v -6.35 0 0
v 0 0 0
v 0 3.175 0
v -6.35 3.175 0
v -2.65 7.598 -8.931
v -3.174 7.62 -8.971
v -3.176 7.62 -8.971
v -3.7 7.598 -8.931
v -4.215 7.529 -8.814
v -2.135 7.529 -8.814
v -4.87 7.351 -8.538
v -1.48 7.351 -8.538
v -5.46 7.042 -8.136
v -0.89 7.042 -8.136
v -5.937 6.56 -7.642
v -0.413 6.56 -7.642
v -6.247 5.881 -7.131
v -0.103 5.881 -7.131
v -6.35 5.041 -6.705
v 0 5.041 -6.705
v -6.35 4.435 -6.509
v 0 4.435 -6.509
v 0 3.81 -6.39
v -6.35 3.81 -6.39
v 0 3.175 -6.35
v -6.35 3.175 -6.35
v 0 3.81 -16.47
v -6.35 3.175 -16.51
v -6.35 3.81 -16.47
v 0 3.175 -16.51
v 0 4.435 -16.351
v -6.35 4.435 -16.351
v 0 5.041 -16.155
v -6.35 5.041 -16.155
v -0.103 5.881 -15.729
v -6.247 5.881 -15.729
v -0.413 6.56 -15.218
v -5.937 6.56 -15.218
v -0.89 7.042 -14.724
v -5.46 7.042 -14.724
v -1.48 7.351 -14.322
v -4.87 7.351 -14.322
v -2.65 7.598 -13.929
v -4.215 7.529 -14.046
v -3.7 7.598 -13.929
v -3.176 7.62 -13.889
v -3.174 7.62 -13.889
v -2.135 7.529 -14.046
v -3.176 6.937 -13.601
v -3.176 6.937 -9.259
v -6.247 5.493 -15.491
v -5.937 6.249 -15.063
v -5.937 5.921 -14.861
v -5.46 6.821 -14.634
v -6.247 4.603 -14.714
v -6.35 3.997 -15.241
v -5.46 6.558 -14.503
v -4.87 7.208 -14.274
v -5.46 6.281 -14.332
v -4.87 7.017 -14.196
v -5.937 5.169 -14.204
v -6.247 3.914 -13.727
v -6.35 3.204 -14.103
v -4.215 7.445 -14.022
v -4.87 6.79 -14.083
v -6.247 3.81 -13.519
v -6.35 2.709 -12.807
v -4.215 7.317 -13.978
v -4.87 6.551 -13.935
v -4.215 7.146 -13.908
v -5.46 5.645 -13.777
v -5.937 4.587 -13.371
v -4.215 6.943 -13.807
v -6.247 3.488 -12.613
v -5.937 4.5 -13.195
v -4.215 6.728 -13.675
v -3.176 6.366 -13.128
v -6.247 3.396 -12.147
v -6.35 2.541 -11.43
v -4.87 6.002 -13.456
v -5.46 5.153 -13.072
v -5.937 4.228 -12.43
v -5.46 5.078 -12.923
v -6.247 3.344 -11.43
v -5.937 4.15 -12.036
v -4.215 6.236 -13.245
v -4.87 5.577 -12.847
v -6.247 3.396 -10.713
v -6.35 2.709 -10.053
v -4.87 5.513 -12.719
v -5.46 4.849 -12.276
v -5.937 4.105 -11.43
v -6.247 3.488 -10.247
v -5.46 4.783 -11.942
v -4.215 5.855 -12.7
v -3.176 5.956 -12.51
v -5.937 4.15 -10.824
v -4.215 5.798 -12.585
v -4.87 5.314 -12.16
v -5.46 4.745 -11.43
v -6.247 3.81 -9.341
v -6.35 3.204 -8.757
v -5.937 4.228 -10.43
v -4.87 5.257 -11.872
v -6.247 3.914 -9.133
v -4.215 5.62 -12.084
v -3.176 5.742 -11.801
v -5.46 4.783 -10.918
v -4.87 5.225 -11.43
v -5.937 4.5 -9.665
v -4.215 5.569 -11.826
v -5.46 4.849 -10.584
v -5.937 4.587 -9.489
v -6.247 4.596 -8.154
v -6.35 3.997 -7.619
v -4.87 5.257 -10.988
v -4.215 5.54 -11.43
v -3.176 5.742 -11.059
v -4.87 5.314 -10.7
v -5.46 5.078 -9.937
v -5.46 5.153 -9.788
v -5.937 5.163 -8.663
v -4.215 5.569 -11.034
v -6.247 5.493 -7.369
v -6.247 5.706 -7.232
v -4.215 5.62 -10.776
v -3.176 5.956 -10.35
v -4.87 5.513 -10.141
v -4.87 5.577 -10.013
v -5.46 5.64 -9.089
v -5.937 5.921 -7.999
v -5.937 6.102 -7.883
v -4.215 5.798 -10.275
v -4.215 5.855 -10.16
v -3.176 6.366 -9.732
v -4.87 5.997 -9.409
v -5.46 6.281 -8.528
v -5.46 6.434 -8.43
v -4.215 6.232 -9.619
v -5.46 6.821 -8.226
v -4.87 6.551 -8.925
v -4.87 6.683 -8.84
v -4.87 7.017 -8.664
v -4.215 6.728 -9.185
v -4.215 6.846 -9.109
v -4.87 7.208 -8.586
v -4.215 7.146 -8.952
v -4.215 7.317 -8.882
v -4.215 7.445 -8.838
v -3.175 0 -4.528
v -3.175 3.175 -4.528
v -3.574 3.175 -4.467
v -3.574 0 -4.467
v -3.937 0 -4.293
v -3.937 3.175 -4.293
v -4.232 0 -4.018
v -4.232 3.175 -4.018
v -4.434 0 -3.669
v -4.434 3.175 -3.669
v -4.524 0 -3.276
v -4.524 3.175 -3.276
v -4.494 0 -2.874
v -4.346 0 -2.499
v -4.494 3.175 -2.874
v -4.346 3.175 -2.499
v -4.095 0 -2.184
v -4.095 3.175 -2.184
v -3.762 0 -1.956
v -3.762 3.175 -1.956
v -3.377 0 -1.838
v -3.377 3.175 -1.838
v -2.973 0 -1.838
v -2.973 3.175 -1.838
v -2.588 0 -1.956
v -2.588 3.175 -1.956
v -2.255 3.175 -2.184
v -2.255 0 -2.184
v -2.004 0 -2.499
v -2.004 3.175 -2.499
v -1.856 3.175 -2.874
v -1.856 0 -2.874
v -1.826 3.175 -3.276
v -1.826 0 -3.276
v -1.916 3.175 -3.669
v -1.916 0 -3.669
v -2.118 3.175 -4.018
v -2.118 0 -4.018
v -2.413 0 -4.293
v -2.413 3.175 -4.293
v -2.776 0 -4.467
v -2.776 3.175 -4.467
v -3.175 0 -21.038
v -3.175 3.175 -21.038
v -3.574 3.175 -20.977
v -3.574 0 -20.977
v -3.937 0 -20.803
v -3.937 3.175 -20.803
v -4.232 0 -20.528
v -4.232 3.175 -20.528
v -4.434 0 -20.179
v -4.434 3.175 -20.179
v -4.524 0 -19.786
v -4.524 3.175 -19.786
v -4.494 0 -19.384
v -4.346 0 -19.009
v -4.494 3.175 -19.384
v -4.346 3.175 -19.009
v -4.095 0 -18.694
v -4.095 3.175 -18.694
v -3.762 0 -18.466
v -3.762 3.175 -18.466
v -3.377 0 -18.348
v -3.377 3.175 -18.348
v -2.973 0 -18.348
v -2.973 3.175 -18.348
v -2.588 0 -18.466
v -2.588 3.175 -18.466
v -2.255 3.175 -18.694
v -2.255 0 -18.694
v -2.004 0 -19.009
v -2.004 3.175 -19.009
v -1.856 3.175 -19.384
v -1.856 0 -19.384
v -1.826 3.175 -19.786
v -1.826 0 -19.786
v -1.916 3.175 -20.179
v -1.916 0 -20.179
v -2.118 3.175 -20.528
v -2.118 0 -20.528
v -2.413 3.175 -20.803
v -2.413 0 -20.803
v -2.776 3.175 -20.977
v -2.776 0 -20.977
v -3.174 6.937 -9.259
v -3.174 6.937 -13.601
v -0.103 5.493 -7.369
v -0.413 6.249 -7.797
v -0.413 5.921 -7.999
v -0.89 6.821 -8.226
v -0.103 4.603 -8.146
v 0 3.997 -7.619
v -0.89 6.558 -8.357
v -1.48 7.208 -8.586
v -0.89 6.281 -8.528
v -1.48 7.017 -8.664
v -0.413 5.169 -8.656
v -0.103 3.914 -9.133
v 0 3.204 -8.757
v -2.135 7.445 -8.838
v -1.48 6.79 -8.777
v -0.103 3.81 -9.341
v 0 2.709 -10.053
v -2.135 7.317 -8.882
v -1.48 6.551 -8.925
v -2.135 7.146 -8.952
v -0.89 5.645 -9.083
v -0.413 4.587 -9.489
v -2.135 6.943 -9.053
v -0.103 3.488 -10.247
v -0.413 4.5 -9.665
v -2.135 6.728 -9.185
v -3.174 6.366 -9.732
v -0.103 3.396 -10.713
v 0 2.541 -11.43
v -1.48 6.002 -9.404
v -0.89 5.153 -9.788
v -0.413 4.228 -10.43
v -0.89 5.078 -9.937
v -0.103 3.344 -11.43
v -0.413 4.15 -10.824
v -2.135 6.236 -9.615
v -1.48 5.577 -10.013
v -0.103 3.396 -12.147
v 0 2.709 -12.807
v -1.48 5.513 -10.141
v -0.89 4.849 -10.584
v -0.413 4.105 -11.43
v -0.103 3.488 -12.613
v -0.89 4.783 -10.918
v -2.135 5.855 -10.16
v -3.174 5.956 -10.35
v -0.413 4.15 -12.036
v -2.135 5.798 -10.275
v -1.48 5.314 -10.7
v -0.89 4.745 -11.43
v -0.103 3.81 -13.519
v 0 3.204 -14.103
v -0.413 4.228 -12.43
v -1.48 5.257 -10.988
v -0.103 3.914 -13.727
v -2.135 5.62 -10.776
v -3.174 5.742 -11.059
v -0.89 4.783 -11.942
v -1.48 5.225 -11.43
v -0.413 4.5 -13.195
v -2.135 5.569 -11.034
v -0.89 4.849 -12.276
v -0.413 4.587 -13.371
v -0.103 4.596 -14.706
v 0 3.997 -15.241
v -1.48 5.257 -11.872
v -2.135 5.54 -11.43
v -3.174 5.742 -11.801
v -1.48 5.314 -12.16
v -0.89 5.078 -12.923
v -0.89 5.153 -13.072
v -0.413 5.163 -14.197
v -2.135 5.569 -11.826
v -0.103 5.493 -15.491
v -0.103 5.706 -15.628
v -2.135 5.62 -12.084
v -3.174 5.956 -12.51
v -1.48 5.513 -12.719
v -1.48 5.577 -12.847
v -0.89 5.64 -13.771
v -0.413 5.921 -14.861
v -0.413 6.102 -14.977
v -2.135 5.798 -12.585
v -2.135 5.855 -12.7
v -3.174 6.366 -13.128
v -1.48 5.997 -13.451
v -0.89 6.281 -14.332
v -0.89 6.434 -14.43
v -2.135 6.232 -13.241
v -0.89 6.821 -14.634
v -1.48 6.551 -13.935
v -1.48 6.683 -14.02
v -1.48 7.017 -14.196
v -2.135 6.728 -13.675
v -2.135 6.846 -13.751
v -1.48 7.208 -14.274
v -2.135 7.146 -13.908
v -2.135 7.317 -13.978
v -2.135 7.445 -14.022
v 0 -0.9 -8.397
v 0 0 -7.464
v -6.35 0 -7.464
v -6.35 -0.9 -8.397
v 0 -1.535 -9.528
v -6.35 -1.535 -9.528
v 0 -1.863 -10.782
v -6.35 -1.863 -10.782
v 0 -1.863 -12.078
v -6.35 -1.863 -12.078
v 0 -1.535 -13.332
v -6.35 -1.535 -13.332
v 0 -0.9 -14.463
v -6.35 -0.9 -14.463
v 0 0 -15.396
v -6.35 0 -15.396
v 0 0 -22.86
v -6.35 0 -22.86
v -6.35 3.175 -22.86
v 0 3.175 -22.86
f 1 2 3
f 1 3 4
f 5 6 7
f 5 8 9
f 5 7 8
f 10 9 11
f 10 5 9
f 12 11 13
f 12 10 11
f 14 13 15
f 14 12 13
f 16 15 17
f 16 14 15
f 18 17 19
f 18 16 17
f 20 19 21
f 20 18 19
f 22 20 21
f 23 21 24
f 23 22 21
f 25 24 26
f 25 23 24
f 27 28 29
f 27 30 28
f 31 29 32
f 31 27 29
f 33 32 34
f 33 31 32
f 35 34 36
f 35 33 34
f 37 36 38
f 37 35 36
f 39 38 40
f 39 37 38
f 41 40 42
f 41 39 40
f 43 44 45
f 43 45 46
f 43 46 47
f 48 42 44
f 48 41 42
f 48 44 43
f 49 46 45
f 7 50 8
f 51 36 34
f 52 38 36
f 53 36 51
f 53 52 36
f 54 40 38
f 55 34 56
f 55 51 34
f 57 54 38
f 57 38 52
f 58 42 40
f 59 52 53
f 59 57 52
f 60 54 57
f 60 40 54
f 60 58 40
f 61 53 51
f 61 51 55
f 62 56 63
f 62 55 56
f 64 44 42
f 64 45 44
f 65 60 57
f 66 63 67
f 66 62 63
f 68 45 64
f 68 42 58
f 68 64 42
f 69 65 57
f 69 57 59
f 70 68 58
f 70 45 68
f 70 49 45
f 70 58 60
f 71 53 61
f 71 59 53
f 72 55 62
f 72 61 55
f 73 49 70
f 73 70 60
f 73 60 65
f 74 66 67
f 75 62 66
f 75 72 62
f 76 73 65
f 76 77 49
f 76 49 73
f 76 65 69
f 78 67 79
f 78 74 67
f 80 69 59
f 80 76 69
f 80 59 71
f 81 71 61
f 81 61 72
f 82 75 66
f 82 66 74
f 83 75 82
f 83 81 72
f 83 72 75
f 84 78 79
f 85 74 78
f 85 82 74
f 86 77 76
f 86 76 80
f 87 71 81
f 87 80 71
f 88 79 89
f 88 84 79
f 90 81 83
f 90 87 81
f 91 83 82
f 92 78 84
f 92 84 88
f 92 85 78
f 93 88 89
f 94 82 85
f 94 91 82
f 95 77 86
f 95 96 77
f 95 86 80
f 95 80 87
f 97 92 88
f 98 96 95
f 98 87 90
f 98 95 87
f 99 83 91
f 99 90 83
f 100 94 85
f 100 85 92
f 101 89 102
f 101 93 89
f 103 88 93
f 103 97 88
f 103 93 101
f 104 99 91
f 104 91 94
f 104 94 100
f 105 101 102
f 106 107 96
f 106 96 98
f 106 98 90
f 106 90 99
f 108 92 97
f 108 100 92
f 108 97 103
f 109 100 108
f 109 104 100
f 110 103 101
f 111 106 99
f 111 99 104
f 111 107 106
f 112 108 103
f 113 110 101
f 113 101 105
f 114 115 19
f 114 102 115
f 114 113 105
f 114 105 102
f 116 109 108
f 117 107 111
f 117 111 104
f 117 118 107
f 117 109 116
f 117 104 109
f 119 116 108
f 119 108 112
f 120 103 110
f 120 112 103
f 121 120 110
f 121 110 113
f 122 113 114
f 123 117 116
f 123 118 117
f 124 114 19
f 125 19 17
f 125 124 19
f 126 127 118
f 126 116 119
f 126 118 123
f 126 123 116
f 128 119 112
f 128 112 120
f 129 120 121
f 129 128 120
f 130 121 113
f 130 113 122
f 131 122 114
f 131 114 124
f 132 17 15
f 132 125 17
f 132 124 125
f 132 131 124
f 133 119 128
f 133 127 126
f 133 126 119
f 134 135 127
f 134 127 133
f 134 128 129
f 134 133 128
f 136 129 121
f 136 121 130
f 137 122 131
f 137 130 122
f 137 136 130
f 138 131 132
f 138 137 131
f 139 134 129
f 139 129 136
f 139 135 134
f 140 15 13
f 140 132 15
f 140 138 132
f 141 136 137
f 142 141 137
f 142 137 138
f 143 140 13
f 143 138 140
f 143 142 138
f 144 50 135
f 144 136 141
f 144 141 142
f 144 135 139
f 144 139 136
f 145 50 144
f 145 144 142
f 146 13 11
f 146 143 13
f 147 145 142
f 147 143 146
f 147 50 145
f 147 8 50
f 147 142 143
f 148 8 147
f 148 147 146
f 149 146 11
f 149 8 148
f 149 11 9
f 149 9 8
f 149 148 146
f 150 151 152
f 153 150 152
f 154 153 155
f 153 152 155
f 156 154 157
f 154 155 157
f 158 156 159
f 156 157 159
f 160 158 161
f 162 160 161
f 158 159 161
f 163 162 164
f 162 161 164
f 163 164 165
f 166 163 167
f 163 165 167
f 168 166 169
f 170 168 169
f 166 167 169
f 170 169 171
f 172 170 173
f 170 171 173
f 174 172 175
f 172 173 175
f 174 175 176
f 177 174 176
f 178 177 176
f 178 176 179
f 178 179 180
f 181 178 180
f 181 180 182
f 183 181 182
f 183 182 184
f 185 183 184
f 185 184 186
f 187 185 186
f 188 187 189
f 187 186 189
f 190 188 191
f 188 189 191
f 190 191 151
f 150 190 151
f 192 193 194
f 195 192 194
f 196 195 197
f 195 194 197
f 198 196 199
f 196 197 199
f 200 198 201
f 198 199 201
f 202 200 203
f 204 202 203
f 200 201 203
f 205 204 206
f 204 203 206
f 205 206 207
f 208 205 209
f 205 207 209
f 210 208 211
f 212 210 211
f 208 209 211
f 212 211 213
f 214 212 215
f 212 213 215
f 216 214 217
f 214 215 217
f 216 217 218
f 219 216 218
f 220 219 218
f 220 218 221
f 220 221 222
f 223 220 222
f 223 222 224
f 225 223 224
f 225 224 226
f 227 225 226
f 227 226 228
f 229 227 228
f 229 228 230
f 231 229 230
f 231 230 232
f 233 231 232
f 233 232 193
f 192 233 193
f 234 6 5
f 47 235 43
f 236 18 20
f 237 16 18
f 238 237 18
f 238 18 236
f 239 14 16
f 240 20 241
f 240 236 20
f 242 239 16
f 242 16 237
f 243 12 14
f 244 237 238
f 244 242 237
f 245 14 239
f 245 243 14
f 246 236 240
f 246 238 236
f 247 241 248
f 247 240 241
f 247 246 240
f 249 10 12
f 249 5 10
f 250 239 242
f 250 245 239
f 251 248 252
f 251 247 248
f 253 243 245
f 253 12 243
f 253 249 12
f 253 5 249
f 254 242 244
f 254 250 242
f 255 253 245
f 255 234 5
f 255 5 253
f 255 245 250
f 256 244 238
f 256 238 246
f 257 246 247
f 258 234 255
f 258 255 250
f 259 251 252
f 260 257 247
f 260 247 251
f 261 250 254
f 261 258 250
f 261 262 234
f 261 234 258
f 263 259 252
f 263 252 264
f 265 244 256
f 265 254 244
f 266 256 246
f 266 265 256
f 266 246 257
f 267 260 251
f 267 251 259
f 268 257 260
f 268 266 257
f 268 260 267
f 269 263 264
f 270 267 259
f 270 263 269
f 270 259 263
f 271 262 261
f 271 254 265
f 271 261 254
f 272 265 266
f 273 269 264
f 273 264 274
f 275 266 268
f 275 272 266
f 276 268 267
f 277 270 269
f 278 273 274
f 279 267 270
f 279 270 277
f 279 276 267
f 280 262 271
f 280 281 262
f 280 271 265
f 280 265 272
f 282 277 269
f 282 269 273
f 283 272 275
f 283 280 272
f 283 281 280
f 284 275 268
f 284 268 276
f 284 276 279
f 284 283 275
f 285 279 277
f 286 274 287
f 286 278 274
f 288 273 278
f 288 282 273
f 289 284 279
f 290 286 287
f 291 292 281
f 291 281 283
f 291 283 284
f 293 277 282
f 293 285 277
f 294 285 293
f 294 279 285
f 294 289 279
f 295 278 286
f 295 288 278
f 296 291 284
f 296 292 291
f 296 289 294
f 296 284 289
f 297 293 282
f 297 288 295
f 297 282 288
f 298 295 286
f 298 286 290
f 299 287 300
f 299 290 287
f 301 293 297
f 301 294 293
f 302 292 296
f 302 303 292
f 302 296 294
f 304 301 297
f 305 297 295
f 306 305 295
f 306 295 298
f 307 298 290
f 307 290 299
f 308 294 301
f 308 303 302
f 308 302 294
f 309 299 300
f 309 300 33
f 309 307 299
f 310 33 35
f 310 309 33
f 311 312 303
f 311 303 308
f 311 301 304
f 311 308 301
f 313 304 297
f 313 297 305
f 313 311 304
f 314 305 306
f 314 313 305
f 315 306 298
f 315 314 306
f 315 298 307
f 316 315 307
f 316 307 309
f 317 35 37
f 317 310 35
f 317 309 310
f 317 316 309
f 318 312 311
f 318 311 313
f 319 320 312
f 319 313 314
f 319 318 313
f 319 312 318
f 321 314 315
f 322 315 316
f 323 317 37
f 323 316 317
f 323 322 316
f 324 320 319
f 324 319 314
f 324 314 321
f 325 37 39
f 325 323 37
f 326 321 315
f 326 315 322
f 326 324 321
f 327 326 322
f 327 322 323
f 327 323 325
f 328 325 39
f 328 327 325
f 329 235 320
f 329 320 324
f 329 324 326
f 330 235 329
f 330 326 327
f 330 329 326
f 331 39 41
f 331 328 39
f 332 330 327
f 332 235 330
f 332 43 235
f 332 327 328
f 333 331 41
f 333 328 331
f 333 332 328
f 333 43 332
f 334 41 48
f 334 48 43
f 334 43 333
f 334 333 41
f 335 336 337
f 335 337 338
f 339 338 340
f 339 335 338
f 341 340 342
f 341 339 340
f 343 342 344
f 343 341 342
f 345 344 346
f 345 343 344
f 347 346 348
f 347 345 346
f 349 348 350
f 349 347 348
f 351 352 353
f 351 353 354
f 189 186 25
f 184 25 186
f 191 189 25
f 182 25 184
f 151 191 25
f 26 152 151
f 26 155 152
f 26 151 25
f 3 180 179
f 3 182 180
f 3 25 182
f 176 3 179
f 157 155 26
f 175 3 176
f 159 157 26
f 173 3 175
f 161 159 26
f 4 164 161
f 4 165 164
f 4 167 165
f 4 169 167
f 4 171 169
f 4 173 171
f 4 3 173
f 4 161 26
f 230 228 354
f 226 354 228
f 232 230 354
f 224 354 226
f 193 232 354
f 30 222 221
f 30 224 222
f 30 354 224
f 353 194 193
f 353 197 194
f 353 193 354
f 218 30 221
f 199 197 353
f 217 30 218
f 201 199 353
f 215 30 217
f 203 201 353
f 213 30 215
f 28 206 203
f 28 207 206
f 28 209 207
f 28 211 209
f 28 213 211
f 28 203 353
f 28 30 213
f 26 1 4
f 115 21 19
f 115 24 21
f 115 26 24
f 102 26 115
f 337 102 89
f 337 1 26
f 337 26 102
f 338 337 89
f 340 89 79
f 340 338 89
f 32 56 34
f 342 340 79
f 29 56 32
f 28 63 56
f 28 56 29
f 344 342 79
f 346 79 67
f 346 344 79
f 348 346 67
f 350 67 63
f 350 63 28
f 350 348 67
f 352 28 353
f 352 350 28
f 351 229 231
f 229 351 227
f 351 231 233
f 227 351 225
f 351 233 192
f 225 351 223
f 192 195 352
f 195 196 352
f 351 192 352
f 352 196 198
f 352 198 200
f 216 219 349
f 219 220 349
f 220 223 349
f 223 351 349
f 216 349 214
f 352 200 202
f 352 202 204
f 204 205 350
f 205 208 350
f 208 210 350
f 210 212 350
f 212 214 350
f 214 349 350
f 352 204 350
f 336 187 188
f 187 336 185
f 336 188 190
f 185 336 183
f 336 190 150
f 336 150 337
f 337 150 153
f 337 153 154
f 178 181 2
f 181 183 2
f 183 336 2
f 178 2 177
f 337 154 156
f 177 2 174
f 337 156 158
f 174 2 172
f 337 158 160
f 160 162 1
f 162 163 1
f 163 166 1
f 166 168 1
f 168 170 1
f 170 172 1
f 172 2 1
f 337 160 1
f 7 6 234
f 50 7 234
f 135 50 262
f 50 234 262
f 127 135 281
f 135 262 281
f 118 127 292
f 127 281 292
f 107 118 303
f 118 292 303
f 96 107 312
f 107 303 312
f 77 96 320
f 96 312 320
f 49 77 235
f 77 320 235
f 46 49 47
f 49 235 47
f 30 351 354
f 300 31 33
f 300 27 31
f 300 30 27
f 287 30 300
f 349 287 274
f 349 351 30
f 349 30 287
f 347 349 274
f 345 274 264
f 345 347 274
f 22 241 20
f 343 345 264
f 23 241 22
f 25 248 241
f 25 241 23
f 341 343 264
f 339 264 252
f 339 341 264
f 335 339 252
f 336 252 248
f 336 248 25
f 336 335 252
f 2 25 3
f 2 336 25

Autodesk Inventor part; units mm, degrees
ref_plane "YZ Plane" through (0, 0, 0) normal (1, 0, 0) x (0, 1, 0)
ref_plane "XZ Plane" through (0, 0, 0) normal (0, 1, 0) x (-1, 0, 0)
ref_plane "XY Plane" through (0, 0, 0) normal (0, 0, 1) x (1, 0, 0)
sketch "Sketch1" plane through (0, 0, 0) normal (0, 1, 0) x (-1, 0, 0)
  line L0 (0, 0) -> (6.35, 0)
  line L1 (6.35, 0) -> (6.35, -22.86)
  line L2 (6.35, -22.86) -> (0, -22.86)
  line L3 (0, -22.86) -> (0, 0)
  line L4 (0, 0) -> (3.175, 0)
  line L5 (3.175, 0) -> (3.175, -3.175)
  line L6 (3.175, -3.175) -> (0, -3.175)
  line L7 (0, -3.175) -> (0, 0)
  line L8 (0, -22.86) -> (3.175, -22.86)
  line L9 (3.175, -22.86) -> (3.175, -19.685)
  line L10 (3.175, -19.685) -> (0, -19.685)
  line L11 (0, -19.685) -> (0, -22.86)
  dimension "d0" = 6.35
  dimension "d1" = 22.86
  dimension "d2" = 3.175
  dimension "d3" = 3.175
  dimension "d4" = 3.175
  dimension "d5" = 3.175
extrude "Extrusion1" add sketch "Sketch1" along normal blind 3.175
hole "Hole1" at (-3.175, 0, -3.175) at (-3.175, 0, -19.685) direction (0, 1, 0) diameter 2.7051 depth 6.35
sketch "Sketch2" plane through (0, 0, 0) normal (1, 0, 0) x (0, 0, -1)
  line L0 (0, 3.175) -> (22.86, 3.175) projected
  circle A0 centre (11.43, 3.175) radius 5.08
  circle A1 centre (11.43, 8.255) radius 2.54
  point P0 (0, 0)
  point P1 (13.8893, 7.62)
  point P2 (8.9707, 7.62)
  point P3 (6.35, 3.175)
  point P4 (16.51, 3.175)
  dimension "d15" = 10.16
  dimension "d16" = 5.08
extrude "Extrusion2" add sketch "Sketch2" against normal blind 6.35 contours A0 A1 L0 | L0 A0
fillet "Fillet1" radius 3.175 2 edges at (0, 5.715, -11.43) (-6.35, 5.715, -11.43)
properties part number "DualSensorReadout - CableClamp"
